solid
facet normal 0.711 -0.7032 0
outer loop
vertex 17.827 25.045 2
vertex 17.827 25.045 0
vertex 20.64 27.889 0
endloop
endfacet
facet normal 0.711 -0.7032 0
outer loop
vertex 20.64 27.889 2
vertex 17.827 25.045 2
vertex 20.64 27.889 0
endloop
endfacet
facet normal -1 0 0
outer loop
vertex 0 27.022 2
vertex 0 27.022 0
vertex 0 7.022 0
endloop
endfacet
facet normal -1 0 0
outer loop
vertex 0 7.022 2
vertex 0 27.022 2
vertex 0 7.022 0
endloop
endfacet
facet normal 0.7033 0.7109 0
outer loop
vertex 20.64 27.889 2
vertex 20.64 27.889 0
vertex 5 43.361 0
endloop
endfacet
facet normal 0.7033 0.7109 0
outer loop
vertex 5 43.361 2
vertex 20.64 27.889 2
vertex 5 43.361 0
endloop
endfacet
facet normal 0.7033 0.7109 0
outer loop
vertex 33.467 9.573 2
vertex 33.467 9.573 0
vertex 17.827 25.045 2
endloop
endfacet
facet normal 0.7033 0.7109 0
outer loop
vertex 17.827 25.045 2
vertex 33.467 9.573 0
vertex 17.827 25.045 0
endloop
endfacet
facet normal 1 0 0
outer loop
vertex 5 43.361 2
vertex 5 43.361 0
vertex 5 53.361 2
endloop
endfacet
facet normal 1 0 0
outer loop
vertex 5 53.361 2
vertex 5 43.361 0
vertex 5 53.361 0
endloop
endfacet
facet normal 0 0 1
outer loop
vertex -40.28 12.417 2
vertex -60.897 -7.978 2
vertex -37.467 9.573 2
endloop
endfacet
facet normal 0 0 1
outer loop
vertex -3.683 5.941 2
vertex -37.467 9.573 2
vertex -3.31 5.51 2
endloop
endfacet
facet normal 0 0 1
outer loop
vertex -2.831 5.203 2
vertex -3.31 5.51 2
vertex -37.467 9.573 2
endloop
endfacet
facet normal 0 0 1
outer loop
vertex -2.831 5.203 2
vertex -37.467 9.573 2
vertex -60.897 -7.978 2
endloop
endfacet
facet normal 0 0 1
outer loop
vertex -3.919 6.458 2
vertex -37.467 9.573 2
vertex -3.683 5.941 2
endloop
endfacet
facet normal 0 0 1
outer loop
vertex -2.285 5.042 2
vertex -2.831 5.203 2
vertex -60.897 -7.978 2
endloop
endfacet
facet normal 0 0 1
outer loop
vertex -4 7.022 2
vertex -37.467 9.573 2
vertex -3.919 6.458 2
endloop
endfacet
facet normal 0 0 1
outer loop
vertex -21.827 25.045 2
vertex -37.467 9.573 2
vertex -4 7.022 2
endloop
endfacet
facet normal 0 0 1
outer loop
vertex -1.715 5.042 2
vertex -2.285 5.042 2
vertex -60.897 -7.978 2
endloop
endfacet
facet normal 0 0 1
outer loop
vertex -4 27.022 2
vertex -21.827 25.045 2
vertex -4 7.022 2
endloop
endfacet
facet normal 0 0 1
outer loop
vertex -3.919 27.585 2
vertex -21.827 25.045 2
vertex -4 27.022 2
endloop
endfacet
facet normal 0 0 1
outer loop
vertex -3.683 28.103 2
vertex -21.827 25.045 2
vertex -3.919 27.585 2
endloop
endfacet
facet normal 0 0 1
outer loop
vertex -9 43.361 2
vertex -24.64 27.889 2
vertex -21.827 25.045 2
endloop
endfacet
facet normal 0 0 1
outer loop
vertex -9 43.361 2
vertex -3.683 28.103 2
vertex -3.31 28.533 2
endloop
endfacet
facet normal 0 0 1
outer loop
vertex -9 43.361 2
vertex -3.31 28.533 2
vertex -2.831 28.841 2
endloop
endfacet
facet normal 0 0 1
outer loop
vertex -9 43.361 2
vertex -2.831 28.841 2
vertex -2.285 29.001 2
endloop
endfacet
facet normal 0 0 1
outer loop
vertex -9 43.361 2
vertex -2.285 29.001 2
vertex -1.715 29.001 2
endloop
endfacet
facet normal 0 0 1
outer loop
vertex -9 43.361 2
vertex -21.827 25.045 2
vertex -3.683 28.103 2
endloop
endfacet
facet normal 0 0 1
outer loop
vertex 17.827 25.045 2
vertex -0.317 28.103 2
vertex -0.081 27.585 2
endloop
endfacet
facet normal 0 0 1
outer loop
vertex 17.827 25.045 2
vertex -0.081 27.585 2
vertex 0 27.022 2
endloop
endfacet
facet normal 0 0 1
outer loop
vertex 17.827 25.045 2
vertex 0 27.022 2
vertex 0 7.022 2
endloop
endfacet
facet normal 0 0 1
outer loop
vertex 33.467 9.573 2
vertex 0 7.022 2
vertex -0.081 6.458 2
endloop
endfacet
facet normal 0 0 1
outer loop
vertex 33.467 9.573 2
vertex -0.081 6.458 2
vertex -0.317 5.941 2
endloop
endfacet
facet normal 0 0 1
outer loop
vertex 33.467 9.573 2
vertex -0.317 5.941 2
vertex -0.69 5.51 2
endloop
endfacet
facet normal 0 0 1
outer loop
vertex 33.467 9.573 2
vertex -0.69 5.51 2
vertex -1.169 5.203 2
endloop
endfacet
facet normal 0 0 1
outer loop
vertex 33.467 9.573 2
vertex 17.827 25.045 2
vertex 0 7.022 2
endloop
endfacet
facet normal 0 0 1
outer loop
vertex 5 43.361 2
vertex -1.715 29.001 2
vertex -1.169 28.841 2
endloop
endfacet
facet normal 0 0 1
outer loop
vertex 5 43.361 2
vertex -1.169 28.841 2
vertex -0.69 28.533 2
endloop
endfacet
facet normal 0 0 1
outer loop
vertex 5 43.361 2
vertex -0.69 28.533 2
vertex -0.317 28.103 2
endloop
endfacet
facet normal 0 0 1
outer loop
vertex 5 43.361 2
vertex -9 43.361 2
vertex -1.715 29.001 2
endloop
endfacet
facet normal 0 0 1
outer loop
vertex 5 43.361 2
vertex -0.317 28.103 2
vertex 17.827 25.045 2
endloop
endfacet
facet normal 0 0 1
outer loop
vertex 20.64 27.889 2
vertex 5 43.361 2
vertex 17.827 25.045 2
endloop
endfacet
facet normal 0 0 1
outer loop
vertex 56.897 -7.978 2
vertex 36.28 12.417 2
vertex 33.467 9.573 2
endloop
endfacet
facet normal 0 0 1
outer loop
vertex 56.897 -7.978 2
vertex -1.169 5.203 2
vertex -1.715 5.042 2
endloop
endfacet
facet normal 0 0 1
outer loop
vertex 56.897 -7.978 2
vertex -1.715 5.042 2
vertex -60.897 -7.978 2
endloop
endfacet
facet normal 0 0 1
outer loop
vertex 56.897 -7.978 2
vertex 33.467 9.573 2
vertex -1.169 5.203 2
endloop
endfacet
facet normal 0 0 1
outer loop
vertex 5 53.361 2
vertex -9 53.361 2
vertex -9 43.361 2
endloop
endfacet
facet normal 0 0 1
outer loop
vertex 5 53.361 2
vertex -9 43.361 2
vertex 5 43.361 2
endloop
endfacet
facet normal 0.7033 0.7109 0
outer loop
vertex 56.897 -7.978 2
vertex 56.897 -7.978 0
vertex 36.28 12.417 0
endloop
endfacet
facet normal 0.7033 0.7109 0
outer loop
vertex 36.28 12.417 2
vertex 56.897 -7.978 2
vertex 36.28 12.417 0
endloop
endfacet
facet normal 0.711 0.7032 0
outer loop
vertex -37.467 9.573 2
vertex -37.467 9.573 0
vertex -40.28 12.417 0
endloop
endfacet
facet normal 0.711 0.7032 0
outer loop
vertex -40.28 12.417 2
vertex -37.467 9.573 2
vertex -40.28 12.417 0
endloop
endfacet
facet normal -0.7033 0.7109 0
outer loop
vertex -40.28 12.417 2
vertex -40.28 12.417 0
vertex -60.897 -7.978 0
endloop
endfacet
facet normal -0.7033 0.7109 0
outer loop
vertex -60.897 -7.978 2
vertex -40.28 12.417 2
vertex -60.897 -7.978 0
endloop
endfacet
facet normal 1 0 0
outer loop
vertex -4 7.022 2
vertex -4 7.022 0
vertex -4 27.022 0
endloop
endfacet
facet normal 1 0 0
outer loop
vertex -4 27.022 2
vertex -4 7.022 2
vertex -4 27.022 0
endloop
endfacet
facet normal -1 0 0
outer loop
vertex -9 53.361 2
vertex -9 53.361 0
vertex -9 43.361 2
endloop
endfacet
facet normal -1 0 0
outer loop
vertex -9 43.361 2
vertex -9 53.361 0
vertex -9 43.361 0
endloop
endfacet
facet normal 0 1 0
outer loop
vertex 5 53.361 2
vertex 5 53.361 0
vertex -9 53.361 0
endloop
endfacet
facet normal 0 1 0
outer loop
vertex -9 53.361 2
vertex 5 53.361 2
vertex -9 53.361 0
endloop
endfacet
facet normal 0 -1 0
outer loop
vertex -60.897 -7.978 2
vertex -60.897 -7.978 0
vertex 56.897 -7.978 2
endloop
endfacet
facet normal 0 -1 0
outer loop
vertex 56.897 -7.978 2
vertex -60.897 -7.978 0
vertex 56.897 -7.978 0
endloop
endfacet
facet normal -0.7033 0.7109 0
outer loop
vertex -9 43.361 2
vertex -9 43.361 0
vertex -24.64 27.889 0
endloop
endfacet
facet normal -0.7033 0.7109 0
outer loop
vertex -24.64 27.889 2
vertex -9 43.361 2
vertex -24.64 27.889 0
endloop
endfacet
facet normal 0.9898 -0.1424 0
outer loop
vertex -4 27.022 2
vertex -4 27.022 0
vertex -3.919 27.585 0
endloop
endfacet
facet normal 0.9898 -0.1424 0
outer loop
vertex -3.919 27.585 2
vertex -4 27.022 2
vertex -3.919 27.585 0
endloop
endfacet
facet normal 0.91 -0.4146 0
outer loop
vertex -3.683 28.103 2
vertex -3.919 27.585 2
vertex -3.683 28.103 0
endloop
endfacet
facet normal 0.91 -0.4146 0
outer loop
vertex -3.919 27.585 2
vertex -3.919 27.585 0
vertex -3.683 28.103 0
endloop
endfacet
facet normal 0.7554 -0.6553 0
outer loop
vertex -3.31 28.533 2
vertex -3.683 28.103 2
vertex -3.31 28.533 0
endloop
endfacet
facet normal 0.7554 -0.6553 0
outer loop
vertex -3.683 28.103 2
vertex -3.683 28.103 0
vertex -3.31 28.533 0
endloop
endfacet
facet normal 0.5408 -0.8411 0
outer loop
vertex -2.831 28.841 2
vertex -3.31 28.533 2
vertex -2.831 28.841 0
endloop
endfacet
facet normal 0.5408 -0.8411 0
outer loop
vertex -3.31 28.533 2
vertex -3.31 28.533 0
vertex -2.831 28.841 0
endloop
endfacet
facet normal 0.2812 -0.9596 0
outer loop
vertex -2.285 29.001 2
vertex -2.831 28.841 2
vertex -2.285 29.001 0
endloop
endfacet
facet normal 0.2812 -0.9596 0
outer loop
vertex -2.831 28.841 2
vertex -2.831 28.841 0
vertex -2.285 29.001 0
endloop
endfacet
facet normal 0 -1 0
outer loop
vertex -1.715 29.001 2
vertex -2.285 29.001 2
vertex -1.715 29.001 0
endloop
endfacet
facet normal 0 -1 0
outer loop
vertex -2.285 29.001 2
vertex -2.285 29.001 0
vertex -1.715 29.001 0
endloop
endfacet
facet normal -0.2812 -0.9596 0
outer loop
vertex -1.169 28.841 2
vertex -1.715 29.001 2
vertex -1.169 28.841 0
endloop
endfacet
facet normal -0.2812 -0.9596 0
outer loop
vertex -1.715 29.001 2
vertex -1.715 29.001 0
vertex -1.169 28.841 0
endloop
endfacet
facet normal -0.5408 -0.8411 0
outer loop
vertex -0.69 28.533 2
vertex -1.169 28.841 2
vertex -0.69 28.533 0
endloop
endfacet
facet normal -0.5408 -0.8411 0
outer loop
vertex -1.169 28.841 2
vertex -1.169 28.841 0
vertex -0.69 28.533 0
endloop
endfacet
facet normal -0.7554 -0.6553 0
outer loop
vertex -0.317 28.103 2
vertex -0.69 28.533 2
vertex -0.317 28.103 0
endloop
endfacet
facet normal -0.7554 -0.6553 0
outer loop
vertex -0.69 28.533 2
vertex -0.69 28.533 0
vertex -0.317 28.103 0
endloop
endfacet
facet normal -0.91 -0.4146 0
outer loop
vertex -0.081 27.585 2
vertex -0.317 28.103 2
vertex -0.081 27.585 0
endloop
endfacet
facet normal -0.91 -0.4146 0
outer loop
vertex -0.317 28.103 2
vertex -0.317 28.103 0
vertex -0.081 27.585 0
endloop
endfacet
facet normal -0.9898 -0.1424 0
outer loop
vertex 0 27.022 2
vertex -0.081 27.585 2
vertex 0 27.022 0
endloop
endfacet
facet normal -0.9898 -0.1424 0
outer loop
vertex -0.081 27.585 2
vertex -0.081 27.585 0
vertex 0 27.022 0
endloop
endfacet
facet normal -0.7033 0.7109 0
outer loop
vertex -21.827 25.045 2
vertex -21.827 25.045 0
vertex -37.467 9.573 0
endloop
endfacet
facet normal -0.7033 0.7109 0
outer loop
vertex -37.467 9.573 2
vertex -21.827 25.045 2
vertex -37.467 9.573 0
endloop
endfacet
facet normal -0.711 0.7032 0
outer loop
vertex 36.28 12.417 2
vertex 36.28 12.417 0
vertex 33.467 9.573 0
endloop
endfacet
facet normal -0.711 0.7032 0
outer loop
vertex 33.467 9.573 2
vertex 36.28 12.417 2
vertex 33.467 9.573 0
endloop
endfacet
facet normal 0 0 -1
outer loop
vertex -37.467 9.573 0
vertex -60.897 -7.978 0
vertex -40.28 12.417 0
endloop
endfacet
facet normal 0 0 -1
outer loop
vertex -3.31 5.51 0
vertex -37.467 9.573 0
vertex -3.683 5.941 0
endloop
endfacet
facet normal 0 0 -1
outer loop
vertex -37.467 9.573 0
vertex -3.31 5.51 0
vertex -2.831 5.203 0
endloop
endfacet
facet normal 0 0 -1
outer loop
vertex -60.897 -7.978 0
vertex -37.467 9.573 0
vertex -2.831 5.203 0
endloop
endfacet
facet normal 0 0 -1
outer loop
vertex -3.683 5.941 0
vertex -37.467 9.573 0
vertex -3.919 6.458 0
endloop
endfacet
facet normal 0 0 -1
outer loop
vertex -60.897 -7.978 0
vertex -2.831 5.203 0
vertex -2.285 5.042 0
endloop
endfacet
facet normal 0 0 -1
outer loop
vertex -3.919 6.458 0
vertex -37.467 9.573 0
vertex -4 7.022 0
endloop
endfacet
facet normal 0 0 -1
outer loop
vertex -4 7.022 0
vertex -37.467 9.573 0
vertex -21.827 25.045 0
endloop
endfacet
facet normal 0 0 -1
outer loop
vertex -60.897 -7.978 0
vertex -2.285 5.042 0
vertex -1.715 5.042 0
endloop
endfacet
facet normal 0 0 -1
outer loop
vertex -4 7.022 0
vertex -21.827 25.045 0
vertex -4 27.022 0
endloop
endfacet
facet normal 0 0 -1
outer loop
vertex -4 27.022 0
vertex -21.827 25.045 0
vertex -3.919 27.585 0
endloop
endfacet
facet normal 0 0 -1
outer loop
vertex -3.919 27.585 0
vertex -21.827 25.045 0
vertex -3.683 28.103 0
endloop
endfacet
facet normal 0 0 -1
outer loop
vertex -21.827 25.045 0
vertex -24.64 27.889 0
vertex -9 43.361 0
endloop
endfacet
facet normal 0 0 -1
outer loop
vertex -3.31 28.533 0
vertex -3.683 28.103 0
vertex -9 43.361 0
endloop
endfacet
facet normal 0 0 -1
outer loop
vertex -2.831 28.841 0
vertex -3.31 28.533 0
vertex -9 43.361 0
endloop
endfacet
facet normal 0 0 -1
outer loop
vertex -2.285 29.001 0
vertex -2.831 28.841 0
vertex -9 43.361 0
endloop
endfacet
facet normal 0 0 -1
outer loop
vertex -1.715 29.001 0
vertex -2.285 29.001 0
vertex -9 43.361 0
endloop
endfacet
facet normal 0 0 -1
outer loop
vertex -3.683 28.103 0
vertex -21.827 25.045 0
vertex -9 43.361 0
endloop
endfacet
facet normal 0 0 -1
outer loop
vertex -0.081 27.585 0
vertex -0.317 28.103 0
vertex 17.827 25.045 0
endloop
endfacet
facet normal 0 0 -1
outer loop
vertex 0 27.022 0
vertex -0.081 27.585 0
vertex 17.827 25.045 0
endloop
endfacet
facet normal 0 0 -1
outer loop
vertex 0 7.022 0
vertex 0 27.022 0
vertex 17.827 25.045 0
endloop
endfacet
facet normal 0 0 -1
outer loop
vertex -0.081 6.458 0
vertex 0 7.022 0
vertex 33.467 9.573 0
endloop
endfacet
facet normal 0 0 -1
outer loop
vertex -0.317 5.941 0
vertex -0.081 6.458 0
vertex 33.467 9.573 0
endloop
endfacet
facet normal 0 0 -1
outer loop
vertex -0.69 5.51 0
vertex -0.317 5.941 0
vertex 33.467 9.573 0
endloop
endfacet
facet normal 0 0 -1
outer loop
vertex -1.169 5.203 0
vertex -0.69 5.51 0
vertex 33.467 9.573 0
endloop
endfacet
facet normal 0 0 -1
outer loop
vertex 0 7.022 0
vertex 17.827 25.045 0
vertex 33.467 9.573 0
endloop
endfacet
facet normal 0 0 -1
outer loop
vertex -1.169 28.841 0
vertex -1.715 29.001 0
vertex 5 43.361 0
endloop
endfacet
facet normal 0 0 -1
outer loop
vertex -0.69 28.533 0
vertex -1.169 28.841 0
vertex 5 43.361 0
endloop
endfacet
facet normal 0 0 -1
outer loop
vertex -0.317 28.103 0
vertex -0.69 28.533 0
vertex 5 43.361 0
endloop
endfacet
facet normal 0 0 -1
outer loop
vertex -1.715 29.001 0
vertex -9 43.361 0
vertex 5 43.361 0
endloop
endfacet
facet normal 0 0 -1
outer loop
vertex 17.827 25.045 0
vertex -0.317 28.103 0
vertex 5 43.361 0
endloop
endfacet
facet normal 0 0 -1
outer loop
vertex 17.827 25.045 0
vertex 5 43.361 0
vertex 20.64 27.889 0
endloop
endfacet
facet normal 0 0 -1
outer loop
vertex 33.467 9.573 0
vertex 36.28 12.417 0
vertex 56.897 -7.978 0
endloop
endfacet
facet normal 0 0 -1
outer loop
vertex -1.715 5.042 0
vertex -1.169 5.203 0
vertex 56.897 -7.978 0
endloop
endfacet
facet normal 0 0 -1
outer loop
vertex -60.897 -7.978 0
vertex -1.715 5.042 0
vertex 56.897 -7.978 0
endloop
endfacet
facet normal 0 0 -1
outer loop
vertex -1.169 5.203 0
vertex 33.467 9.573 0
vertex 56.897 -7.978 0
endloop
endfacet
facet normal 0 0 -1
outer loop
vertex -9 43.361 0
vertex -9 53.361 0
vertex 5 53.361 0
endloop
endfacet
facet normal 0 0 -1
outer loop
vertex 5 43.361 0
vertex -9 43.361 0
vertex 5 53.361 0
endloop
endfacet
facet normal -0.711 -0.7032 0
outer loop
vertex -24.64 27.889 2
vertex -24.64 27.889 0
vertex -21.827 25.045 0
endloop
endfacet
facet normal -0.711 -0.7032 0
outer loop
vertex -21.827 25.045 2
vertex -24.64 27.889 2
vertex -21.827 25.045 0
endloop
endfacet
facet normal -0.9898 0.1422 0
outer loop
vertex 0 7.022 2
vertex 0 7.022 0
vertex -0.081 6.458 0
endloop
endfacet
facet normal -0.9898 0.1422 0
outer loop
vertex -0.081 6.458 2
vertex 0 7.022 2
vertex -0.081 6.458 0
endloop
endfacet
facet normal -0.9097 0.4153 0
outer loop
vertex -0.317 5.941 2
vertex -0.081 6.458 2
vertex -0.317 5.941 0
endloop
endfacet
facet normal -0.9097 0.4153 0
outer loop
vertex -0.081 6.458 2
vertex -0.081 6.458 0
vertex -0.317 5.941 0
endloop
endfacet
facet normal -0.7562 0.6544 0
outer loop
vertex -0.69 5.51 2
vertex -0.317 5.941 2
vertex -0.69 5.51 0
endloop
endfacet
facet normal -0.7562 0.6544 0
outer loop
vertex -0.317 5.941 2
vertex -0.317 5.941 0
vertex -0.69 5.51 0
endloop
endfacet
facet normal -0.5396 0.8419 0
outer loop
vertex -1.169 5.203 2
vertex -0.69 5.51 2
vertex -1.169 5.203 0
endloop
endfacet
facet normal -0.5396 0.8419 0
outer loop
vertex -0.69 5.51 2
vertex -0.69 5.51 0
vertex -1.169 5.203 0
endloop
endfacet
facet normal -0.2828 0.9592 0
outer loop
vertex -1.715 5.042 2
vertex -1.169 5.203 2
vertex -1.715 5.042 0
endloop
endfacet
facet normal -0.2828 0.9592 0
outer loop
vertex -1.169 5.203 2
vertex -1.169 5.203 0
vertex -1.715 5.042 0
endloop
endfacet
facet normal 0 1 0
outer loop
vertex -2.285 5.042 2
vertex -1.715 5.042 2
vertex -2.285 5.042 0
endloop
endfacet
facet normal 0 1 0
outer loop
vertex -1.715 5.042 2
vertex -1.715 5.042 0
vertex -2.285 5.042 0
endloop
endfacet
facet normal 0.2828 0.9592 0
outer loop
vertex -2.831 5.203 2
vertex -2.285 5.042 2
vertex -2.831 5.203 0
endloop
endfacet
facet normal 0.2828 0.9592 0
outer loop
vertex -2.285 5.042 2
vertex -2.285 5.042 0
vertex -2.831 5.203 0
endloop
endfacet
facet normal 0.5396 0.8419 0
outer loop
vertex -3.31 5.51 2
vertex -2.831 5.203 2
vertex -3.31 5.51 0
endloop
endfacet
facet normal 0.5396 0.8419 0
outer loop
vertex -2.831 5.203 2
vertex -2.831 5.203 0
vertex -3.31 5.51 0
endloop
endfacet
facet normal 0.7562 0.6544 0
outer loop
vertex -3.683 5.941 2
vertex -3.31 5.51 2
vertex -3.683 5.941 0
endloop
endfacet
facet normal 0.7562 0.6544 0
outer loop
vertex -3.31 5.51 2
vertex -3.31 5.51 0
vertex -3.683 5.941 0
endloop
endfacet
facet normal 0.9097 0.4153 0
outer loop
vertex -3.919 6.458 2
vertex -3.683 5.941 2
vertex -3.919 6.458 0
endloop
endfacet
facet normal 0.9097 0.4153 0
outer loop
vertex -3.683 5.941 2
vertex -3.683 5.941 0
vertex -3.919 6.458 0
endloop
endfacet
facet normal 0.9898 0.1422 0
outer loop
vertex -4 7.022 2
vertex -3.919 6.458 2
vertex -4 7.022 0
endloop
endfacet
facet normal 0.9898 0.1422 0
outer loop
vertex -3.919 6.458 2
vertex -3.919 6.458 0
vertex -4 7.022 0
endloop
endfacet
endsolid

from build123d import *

# Parameters (mm, degrees)
F1_DEPTH = 2


with BuildPart() as f1:
    # F0 (on Top) → F1 (new body)
    with BuildSketch(Plane.XY):
        Polygon((-24.640209, 27.888809), (-21.827112, 25.045134), (-37.467321, 9.5731), (-40.280418, 12.416774), (-60.897057, -7.978181), (56.897057, -7.978181), (36.280418, 12.416774), (33.467321, 9.5731), (17.827112, 25.045134), (20.640209, 27.888809), (5, 43.360843), (5, 53.360843), (-9, 53.360843), (-9, 43.360843), align=None)
        with BuildLine():
            Line((0, 27.021819), (0, 7.021819))
            ThreePointArc((0, 7.021819), (-2, 5.021819), (-4, 7.021819))
            Line((-4, 7.021819), (-4, 27.021819))
            ThreePointArc((-4, 27.021819), (-2, 29.021819), (0, 27.021819))
        make_face(mode=Mode.SUBTRACT)
    extrude(amount=F1_DEPTH)


solid = f1.part
